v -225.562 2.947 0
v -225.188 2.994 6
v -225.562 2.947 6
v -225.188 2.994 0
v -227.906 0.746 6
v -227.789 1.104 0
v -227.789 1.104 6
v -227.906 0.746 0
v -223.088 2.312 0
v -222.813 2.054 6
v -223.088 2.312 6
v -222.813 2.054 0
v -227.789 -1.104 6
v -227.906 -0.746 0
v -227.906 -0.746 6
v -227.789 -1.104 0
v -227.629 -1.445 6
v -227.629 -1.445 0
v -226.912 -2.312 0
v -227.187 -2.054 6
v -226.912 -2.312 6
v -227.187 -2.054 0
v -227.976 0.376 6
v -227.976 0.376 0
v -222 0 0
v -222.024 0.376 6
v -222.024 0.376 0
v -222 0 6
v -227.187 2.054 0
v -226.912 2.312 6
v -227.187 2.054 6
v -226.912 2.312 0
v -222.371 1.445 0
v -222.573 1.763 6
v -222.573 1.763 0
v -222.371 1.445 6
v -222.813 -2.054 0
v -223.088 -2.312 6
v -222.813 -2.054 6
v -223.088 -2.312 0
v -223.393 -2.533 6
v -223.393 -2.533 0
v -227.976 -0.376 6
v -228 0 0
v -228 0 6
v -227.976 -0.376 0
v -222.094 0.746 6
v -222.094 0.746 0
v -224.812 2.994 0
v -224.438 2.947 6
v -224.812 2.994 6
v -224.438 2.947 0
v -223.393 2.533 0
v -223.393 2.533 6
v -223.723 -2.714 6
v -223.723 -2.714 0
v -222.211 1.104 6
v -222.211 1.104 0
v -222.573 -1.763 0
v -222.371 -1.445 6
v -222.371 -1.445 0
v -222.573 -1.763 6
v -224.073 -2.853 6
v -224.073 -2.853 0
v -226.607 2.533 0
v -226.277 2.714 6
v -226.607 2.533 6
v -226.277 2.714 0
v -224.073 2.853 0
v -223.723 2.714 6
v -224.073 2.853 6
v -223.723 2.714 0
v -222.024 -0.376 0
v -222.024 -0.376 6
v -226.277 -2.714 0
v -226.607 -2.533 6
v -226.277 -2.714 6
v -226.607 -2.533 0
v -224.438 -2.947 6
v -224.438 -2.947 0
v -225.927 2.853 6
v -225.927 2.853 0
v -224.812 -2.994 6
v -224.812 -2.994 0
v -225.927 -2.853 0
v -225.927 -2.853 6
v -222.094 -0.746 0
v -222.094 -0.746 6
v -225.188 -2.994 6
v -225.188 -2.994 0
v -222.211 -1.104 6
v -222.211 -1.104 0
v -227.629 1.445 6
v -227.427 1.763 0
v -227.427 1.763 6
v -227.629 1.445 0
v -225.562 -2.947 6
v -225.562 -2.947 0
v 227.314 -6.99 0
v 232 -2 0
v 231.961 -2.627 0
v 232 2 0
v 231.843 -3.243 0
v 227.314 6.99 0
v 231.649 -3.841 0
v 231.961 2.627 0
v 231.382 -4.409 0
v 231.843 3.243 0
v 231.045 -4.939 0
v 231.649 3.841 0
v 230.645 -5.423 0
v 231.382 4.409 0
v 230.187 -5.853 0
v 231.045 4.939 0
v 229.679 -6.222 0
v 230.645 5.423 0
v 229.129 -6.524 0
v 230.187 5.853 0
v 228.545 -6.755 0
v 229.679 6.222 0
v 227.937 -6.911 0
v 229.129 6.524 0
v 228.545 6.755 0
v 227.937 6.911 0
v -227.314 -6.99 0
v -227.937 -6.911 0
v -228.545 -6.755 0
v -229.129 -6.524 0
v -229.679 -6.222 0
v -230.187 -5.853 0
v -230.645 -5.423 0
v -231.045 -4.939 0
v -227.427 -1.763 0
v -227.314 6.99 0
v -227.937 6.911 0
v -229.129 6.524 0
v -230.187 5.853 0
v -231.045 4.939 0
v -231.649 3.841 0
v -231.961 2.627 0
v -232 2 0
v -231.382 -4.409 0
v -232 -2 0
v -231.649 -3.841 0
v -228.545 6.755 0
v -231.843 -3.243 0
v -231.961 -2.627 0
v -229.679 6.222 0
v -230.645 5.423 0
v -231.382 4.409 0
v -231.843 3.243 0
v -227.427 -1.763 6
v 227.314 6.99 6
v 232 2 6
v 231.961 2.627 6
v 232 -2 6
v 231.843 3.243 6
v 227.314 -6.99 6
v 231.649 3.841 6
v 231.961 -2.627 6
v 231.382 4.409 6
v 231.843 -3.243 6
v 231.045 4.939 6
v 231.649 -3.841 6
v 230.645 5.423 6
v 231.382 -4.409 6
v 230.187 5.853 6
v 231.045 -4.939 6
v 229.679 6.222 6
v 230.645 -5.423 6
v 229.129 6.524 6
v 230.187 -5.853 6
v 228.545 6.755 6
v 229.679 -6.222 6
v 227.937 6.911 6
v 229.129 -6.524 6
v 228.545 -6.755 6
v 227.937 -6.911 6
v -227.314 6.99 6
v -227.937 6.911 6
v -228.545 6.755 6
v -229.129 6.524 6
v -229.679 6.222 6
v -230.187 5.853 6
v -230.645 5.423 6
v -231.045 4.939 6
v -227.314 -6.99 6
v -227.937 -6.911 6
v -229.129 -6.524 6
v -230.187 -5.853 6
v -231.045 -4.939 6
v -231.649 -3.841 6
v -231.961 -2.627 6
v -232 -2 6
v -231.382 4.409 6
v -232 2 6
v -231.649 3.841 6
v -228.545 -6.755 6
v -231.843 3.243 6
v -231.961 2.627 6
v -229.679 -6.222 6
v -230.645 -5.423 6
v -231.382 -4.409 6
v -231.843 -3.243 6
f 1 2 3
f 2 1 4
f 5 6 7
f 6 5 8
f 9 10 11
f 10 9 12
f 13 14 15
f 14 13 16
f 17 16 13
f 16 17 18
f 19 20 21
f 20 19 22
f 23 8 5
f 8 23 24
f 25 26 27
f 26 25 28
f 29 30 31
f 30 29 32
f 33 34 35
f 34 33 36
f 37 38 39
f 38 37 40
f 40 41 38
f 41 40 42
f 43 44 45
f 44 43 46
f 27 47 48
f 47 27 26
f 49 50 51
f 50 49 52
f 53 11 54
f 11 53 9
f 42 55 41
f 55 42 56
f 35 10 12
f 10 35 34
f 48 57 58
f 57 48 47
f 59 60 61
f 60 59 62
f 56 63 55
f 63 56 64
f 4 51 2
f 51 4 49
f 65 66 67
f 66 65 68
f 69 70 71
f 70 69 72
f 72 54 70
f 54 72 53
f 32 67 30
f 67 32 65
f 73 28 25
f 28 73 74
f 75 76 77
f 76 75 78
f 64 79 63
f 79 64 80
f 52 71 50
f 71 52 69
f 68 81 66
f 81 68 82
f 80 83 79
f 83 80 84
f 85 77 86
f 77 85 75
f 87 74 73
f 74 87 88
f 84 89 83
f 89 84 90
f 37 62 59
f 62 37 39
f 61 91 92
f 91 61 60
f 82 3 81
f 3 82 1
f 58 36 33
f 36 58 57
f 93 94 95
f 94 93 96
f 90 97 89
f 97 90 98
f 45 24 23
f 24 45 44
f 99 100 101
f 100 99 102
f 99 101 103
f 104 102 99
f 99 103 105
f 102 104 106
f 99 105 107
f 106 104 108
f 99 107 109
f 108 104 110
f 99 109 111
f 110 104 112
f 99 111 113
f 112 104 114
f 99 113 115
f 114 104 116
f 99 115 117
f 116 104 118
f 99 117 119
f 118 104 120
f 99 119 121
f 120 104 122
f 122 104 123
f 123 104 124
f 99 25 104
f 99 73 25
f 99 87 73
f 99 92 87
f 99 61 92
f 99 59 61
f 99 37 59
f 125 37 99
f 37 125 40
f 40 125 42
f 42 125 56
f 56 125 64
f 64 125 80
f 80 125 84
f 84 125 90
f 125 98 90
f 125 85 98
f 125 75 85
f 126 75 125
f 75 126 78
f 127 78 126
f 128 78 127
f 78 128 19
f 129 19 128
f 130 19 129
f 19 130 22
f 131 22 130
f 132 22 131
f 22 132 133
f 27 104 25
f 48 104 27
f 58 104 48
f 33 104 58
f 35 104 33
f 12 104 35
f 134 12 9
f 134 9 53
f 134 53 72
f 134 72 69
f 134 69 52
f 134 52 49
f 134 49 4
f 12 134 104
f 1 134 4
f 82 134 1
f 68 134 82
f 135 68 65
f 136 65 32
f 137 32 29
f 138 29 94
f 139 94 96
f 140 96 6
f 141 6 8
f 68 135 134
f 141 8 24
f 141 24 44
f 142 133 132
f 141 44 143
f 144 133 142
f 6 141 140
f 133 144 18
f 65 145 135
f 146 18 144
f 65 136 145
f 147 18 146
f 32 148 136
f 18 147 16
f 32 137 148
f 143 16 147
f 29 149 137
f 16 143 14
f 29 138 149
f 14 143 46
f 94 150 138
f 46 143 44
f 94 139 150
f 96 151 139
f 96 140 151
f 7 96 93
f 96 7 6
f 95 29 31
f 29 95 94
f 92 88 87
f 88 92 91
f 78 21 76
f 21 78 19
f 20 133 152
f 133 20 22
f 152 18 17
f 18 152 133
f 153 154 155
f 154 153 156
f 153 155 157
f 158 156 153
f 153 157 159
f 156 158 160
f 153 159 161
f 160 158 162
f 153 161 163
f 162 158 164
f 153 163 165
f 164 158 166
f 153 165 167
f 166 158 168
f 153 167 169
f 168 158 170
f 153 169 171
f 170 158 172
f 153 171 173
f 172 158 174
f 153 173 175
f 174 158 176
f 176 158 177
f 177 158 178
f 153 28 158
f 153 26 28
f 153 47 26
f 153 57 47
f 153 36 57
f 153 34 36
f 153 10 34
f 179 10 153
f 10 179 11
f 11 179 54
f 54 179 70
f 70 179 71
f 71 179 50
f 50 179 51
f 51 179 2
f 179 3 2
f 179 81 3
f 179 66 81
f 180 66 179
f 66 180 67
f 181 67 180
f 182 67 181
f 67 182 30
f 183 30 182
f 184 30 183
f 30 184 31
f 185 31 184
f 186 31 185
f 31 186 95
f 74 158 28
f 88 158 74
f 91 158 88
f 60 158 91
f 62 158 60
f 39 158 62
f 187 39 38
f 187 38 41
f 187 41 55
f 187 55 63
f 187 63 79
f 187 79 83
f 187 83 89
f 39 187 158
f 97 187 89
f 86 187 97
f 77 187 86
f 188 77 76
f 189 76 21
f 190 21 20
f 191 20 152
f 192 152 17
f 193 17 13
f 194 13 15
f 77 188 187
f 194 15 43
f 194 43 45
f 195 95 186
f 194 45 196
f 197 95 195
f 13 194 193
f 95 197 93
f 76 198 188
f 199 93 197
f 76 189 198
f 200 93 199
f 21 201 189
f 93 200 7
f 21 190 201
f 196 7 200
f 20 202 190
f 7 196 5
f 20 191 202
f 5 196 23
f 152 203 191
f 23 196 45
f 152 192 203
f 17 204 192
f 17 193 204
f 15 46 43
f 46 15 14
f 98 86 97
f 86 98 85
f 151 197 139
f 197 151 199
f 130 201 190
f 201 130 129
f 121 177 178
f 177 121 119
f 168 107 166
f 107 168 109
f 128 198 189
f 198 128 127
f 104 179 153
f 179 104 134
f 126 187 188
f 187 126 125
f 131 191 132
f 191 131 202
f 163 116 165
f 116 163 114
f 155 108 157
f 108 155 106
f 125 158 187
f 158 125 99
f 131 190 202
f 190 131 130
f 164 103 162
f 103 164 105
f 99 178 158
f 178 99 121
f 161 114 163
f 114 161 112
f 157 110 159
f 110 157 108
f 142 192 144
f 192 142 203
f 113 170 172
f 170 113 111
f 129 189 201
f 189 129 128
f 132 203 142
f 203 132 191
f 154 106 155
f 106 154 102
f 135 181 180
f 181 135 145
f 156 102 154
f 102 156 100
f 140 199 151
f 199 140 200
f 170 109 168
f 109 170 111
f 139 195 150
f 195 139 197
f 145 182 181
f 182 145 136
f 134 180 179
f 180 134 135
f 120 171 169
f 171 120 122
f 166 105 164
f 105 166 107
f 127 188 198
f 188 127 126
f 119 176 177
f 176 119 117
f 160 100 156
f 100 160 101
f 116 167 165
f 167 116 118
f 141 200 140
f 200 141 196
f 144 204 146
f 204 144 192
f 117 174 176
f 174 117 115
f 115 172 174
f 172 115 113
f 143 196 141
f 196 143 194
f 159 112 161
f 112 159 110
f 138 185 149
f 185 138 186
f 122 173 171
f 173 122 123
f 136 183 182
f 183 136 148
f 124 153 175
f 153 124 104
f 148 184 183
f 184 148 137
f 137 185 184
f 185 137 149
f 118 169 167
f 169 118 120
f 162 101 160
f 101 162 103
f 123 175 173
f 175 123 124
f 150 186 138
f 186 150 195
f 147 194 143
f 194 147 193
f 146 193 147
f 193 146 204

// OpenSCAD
$fn = 50;


difference() {
	union() {
		hull() {
			translate(v = [-227.0000000000, 2.0000000000, 0]) {
				cylinder(h = 6, r = 5);
			}
			translate(v = [227.0000000000, 2.0000000000, 0]) {
				cylinder(h = 6, r = 5);
			}
			translate(v = [-227.0000000000, -2.0000000000, 0]) {
				cylinder(h = 6, r = 5);
			}
			translate(v = [227.0000000000, -2.0000000000, 0]) {
				cylinder(h = 6, r = 5);
			}
		}
	}
	union() {
		translate(v = [-225.0000000000, 0.0000000000, 0]) {
			cylinder(h = 6, r = 3.0000000000);
		}
		translate(v = [-225.0000000000, 0.0000000000, 0]) {
			cylinder(h = 6, r = 1.5000000000);
		}
		translate(v = [-225.0000000000, 0.0000000000, 0]) {
			cylinder(h = 6, r = 1.5000000000);
		}
		translate(v = [-225.0000000000, 0.0000000000, 0]) {
			cylinder(h = 6, r = 1.5000000000);
		}
	}
}
